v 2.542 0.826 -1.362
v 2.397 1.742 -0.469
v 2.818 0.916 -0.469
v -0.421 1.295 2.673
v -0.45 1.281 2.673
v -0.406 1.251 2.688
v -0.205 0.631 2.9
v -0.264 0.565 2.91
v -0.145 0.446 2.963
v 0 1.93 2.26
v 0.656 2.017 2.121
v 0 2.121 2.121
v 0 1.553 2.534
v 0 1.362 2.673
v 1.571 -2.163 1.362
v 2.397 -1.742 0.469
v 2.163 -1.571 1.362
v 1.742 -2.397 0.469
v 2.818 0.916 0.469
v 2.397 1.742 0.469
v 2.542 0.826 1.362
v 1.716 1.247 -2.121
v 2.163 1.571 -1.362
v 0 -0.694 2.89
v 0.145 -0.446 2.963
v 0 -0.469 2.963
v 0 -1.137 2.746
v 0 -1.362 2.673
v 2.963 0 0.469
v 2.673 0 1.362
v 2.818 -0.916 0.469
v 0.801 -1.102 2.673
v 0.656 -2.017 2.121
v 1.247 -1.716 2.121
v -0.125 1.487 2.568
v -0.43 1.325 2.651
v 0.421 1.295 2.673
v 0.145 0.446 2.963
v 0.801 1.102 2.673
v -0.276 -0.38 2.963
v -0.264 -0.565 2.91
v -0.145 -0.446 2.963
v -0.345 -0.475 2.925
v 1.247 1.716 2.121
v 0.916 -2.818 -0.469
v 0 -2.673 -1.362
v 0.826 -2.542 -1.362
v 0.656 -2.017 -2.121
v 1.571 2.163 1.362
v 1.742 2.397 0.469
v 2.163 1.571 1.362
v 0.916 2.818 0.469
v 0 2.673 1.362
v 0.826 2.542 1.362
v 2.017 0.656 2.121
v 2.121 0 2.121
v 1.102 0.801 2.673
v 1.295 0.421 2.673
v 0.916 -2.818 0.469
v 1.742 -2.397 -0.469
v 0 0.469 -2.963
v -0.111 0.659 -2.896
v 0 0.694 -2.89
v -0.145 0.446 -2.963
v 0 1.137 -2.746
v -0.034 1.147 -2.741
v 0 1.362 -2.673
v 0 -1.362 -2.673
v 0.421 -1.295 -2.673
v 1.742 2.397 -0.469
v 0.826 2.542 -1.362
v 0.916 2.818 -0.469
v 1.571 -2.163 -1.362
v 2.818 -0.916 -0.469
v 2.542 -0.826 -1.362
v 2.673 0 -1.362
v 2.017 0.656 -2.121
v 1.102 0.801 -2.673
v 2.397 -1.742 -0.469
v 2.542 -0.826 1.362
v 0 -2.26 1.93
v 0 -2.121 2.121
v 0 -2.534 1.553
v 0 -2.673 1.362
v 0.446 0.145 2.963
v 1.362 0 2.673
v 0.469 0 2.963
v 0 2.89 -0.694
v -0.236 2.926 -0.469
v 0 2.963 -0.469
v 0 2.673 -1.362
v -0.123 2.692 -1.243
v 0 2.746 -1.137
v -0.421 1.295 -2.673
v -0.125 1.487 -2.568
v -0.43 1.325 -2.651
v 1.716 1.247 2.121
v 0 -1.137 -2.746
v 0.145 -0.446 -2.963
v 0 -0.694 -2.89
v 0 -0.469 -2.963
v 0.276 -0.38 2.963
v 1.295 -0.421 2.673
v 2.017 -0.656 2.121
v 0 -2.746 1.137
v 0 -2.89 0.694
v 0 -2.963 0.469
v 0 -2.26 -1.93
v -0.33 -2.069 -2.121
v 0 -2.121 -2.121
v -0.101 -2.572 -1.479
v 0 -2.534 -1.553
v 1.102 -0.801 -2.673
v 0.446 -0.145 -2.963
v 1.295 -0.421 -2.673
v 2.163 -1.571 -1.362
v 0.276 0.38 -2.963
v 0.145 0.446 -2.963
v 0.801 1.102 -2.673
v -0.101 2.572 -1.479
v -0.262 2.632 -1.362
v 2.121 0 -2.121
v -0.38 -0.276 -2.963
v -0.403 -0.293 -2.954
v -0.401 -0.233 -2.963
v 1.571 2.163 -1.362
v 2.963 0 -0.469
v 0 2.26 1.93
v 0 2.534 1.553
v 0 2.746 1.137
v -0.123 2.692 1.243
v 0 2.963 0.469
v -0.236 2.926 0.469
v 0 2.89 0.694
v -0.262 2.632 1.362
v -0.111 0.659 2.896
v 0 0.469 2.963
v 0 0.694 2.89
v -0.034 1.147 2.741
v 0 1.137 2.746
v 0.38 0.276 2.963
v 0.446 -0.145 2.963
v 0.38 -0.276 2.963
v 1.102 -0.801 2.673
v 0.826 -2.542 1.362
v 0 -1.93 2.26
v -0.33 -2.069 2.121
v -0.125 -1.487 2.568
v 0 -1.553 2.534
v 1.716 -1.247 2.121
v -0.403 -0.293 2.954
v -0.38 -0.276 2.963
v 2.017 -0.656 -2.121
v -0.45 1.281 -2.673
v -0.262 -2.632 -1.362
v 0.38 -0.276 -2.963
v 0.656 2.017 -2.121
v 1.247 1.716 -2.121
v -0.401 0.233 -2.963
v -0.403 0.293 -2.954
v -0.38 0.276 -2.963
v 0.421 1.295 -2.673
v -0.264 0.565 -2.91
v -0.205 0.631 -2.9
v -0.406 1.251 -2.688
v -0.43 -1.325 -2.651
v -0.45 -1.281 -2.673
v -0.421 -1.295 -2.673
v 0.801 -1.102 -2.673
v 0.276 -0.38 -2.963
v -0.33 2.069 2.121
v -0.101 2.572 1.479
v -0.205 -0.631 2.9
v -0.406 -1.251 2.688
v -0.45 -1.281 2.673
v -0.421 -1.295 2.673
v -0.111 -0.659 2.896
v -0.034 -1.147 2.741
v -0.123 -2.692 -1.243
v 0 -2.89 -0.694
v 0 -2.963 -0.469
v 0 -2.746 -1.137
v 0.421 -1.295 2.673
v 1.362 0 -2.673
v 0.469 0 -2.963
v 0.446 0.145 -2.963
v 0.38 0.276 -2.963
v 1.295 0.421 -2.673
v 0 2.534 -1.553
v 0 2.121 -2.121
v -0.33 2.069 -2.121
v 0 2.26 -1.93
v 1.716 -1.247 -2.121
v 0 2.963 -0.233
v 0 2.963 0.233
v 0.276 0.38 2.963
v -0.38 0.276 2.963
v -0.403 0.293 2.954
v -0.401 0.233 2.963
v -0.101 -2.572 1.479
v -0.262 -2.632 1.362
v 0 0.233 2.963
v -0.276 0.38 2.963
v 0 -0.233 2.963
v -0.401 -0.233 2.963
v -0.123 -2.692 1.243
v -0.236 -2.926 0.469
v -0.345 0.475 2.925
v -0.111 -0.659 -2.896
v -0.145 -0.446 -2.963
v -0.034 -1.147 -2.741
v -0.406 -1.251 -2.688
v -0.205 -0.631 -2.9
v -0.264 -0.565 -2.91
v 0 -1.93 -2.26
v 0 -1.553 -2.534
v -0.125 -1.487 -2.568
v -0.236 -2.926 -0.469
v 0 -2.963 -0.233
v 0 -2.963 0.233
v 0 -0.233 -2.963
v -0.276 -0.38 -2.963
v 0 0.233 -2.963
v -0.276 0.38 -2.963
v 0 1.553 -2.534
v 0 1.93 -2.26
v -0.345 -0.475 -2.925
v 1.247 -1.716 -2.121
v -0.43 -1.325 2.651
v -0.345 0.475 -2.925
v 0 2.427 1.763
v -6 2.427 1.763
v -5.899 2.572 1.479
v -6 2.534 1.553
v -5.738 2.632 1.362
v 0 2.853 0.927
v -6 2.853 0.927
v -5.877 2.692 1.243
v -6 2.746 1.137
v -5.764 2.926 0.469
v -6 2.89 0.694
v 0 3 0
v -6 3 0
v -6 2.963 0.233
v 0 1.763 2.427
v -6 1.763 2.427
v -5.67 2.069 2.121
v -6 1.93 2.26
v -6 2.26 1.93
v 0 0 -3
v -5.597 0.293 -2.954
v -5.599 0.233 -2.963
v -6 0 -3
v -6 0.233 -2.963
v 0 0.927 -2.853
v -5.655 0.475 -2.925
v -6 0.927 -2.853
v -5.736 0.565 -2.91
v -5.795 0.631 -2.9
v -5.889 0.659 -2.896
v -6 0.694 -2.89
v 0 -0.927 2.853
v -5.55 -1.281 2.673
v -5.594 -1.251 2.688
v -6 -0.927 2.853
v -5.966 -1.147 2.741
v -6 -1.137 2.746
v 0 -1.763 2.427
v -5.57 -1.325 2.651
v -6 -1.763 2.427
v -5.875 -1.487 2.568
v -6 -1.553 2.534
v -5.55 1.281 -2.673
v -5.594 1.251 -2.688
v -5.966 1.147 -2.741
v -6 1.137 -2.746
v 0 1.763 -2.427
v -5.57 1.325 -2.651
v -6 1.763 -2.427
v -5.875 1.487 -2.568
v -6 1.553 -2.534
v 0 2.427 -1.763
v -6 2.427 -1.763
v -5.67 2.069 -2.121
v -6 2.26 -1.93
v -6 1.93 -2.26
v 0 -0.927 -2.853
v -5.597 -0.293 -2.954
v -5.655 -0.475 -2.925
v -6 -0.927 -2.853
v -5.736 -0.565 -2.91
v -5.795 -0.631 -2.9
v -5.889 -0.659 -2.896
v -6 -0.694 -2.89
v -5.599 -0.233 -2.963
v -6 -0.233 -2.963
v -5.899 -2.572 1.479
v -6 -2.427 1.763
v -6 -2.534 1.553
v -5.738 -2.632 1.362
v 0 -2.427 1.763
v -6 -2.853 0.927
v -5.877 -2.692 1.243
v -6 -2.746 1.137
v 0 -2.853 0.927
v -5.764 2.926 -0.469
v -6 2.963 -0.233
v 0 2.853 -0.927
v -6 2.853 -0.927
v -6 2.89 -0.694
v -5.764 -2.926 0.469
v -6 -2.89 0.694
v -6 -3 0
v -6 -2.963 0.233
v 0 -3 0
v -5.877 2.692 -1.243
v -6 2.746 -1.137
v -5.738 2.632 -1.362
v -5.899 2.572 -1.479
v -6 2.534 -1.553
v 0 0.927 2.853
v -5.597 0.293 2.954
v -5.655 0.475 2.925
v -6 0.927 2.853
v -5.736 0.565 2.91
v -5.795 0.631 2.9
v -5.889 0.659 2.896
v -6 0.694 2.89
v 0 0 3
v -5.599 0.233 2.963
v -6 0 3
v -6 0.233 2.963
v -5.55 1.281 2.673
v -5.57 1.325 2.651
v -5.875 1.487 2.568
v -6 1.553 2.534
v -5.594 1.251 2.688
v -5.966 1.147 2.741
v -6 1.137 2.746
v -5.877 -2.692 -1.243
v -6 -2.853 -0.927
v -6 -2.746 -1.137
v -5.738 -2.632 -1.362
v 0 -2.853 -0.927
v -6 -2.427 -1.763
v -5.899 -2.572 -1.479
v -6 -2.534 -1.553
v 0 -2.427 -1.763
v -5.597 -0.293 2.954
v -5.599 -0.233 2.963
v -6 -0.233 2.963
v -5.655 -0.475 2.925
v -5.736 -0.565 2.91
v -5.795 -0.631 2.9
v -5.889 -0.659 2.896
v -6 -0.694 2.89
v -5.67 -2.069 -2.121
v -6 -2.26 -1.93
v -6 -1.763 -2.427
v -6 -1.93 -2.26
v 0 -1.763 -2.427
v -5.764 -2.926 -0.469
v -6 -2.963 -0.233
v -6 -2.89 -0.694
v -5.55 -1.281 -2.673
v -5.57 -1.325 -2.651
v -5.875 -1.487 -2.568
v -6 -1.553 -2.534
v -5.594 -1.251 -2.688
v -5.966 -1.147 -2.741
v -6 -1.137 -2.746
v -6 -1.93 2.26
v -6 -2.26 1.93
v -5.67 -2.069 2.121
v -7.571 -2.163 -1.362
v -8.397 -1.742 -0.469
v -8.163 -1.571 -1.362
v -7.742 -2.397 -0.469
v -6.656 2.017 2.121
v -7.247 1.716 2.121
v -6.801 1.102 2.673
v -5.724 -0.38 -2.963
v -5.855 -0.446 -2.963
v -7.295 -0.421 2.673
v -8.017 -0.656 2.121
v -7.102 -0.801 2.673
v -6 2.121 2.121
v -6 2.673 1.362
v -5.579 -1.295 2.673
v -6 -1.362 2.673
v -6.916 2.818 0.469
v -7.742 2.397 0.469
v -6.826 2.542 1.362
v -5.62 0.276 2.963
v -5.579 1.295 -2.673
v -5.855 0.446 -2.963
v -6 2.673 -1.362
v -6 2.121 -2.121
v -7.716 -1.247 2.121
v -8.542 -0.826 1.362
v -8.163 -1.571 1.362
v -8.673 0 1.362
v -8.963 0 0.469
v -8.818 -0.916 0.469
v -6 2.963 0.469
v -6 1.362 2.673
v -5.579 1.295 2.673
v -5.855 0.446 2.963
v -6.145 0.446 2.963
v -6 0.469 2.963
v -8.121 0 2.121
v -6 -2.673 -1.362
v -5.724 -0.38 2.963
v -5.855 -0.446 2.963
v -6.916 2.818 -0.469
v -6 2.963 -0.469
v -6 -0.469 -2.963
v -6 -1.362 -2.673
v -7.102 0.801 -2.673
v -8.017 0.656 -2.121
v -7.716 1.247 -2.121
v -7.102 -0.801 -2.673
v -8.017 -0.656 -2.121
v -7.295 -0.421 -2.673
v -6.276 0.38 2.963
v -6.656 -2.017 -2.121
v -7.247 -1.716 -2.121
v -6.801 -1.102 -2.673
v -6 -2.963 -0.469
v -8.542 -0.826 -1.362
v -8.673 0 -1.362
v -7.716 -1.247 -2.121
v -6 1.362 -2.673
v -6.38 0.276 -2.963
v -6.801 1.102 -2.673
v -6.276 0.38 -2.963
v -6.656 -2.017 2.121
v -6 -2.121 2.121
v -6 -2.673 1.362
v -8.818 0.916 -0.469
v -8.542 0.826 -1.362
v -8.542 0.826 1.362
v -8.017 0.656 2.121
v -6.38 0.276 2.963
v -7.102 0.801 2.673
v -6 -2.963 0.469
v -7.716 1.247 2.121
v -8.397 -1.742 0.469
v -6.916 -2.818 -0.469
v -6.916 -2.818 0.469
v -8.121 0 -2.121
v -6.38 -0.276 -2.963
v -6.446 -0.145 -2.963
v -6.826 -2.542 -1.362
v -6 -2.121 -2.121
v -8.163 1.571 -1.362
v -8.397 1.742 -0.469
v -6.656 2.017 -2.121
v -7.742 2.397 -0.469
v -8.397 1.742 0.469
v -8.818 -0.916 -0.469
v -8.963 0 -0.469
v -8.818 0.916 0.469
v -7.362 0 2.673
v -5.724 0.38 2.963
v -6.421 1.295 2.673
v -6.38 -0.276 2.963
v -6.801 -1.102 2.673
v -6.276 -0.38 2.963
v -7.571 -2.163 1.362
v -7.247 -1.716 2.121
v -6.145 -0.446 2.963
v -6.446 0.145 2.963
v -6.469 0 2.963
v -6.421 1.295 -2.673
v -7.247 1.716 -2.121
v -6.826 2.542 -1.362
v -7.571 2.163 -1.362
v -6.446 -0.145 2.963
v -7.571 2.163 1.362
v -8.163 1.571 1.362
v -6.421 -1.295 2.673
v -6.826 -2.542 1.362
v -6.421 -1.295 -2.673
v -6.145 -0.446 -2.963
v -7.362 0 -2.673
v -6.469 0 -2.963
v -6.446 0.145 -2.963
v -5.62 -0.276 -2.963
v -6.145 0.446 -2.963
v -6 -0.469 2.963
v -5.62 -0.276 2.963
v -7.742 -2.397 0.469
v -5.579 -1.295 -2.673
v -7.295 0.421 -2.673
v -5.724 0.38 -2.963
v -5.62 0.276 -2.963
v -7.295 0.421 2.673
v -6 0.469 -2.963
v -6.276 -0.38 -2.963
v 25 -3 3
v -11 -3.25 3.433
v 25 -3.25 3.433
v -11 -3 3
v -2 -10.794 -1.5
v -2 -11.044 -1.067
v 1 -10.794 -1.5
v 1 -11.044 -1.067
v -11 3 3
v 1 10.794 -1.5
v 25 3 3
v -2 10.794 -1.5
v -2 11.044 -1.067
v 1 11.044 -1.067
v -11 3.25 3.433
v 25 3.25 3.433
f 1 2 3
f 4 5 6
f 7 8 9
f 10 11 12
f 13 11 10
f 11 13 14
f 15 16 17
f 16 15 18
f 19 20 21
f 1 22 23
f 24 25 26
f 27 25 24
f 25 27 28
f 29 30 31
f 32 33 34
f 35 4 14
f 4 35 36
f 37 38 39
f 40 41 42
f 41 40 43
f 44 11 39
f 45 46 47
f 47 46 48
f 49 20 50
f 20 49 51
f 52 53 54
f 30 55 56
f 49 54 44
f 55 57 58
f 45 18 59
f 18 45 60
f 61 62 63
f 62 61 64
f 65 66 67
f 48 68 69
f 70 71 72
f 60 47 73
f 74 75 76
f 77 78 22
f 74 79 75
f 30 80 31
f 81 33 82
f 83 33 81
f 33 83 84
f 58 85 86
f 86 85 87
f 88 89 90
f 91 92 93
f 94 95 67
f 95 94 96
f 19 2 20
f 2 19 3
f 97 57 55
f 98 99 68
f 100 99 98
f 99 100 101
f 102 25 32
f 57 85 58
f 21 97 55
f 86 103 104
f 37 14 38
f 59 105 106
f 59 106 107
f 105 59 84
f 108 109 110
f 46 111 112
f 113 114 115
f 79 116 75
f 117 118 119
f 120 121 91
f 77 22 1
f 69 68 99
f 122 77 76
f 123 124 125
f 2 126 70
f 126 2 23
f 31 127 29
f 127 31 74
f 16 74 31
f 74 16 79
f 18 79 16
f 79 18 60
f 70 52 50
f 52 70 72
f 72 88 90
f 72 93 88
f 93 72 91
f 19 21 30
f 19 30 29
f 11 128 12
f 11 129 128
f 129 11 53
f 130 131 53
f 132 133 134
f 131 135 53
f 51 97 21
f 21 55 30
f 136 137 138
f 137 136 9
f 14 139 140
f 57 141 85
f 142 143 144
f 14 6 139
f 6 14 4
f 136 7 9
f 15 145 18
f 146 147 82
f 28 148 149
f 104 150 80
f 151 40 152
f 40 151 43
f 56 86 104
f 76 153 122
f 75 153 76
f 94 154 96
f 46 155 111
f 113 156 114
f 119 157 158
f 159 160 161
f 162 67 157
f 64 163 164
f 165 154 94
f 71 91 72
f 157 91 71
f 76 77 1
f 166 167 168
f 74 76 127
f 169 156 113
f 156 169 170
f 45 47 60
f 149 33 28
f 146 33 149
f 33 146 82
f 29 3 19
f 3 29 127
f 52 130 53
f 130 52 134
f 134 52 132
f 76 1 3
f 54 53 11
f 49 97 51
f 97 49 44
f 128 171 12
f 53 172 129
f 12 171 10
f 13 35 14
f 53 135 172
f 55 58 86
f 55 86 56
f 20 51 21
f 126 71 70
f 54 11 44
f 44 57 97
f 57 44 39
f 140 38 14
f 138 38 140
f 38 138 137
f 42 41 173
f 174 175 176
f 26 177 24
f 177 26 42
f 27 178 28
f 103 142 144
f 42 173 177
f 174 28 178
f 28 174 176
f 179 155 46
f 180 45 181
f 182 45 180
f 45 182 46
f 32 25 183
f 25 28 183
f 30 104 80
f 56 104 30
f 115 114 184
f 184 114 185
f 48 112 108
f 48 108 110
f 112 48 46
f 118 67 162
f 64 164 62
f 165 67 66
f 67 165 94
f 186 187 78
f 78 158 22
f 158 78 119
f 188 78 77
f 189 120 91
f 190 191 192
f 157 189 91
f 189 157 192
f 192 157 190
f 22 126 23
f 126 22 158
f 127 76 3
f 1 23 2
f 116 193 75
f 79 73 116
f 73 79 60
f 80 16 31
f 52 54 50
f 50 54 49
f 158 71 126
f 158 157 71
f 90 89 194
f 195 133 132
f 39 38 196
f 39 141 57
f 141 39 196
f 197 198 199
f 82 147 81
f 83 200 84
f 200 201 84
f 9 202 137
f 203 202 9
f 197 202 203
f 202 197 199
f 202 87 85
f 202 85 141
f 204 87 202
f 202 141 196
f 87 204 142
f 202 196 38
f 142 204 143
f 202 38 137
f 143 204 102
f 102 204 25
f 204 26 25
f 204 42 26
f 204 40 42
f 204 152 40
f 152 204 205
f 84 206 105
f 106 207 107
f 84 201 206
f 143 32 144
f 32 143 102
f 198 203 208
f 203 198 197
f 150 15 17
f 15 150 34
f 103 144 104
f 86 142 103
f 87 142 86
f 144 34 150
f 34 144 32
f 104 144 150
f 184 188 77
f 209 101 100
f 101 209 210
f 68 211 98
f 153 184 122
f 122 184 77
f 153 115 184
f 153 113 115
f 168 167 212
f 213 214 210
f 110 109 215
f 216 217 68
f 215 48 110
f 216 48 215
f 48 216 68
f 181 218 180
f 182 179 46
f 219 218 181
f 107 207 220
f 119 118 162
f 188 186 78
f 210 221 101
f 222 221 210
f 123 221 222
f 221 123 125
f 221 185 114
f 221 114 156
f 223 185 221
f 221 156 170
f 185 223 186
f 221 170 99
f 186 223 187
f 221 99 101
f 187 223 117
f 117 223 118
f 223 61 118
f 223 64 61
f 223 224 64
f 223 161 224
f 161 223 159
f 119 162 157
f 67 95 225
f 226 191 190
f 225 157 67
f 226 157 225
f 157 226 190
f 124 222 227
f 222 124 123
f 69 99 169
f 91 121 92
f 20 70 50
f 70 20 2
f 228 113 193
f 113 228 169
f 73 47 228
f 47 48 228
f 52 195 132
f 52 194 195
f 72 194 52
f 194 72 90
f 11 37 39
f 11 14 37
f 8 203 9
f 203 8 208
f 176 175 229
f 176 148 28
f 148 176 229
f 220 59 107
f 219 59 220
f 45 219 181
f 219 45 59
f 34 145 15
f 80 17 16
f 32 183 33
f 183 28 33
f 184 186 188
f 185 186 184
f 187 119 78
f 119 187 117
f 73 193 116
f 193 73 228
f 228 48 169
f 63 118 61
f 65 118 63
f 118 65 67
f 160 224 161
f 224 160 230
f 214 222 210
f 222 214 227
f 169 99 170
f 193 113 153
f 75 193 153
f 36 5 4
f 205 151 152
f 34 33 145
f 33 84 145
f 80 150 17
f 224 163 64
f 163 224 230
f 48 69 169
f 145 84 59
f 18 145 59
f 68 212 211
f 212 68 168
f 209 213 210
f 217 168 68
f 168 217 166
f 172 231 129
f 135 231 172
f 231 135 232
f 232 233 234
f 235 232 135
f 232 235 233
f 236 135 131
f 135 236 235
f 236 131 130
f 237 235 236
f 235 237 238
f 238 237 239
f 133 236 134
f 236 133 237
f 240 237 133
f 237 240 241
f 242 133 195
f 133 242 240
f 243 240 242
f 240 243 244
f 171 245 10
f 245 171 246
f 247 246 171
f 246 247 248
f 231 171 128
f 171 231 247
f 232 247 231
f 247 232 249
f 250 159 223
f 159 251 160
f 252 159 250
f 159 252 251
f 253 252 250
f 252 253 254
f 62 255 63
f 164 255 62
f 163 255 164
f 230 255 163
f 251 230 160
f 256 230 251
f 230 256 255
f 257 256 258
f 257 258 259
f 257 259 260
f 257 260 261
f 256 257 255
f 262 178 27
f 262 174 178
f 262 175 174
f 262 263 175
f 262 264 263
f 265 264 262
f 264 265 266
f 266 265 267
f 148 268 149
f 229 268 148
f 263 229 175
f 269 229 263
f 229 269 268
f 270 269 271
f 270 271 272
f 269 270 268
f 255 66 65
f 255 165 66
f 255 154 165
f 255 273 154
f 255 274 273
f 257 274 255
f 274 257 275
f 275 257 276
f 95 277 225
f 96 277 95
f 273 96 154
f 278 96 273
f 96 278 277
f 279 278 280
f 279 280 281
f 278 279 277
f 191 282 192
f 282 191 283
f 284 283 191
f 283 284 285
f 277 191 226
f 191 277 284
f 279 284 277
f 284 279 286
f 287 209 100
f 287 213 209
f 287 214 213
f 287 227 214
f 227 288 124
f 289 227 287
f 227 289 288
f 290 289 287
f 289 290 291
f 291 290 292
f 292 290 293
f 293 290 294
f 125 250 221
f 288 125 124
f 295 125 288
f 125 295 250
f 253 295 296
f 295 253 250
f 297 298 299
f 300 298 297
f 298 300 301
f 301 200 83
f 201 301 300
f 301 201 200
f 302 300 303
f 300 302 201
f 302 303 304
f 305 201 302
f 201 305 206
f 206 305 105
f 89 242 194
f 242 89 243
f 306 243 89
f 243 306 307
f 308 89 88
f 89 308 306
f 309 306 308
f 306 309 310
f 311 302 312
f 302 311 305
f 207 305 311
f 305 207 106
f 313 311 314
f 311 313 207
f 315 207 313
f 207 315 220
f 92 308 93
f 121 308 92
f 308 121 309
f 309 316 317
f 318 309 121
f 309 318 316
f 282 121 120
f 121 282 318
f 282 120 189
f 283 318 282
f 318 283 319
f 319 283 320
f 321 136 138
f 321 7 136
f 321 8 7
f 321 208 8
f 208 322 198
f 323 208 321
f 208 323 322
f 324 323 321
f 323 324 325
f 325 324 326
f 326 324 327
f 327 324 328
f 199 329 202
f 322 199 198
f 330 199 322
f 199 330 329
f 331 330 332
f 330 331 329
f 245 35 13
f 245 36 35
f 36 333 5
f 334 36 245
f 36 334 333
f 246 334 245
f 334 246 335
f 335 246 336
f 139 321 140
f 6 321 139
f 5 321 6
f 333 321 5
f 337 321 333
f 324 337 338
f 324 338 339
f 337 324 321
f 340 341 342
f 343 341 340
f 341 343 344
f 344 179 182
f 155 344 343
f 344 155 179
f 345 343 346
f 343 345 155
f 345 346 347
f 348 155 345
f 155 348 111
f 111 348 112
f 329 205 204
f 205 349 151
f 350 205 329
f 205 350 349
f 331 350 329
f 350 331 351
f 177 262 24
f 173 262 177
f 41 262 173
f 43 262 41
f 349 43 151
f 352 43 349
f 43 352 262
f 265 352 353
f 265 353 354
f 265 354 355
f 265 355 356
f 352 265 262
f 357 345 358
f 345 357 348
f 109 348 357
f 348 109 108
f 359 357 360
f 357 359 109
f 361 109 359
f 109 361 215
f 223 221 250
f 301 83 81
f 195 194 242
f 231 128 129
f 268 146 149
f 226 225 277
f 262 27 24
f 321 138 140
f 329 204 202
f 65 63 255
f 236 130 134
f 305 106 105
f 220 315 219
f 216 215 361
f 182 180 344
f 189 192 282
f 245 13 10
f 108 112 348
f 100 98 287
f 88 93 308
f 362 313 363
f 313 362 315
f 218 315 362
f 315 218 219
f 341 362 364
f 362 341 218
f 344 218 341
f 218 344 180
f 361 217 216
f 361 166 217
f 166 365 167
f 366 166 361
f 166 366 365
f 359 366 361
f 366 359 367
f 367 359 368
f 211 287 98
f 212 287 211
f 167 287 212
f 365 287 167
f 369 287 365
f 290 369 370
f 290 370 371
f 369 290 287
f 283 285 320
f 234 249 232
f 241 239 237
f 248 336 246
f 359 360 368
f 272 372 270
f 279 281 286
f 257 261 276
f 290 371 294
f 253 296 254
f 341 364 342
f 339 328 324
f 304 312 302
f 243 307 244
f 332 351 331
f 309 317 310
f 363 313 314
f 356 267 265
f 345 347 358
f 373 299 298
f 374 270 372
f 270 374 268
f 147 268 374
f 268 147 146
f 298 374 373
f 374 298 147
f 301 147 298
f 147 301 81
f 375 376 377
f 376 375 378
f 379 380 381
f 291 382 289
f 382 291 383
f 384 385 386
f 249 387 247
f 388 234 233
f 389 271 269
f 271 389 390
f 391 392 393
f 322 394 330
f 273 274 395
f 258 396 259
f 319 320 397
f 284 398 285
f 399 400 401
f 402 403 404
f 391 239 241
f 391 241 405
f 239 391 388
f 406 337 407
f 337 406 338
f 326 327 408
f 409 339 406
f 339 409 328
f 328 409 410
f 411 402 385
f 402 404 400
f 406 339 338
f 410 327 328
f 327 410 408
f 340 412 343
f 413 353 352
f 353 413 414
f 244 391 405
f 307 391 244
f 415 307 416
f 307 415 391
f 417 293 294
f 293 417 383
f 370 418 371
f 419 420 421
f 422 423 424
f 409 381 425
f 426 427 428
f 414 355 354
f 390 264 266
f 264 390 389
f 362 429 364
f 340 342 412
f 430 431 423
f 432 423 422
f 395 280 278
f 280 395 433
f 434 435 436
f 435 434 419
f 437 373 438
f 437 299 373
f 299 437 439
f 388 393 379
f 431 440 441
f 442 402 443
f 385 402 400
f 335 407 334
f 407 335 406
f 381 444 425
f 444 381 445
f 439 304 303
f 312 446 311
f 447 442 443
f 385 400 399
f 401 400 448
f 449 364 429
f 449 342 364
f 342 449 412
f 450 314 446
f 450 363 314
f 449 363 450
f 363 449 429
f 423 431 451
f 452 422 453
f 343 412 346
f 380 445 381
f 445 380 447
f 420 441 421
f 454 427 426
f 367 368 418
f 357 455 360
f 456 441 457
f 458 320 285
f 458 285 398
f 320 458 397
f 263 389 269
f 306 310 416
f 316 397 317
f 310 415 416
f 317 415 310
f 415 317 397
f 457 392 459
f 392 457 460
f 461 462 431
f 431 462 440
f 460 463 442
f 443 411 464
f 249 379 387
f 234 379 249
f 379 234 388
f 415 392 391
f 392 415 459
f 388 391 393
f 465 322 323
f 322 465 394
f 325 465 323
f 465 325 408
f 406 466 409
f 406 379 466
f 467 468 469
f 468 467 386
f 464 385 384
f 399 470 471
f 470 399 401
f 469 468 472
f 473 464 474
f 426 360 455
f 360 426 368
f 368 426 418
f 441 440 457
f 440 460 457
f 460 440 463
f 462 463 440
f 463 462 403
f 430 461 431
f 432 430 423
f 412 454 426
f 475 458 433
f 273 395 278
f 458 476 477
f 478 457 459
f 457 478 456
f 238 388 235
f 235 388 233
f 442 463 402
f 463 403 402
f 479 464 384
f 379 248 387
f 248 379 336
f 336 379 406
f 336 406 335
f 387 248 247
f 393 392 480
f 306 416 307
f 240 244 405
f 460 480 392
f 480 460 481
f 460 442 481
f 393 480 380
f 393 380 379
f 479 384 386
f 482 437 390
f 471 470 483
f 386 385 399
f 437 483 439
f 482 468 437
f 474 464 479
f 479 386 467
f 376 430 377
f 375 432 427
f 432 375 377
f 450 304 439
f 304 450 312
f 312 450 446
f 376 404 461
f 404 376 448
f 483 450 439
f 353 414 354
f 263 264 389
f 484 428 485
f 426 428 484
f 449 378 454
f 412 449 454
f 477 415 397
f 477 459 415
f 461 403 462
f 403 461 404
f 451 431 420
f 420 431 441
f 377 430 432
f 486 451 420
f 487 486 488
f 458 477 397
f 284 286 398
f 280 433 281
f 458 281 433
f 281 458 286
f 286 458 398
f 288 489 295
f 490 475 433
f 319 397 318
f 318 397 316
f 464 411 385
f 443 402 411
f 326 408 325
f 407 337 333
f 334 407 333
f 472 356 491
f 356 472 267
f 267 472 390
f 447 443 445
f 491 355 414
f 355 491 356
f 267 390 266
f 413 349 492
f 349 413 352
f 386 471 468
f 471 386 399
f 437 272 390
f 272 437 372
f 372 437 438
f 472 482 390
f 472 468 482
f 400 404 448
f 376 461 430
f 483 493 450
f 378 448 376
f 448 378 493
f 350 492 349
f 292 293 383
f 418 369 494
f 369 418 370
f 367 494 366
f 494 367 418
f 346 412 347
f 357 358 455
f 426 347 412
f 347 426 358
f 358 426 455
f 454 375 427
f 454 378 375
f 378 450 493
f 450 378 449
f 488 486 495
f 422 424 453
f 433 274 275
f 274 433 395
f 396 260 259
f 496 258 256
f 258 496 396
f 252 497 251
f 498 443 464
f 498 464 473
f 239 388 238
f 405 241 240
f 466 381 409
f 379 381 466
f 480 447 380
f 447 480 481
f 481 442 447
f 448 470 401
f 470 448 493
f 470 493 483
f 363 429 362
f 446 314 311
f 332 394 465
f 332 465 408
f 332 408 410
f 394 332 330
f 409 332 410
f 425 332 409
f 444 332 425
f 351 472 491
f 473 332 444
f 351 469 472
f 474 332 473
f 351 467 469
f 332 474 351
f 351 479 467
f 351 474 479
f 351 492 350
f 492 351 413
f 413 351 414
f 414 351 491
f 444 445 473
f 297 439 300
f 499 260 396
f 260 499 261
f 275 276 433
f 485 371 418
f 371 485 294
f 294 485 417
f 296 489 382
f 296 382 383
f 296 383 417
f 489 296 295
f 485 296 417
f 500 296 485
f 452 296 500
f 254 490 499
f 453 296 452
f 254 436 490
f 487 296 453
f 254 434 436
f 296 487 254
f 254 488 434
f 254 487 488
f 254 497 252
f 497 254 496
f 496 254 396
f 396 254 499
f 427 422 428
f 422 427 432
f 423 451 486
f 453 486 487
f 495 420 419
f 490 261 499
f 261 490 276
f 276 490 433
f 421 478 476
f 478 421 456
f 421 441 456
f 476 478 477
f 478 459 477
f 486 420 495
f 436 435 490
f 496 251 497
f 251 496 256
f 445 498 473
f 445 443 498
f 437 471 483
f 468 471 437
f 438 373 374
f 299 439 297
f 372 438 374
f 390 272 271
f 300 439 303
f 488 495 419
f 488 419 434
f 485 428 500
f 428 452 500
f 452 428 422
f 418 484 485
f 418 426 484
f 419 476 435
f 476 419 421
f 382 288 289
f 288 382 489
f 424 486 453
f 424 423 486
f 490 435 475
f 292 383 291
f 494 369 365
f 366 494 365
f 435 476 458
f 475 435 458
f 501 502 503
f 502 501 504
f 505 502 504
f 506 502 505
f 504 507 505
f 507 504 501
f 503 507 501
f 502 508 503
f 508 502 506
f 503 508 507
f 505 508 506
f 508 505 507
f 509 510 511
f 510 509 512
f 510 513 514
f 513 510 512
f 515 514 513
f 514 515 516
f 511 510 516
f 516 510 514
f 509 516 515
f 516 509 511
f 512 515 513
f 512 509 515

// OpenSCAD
    
    
    
    
    module Cuerpo(radio=3,def=20,largoT=6){
    //cabina
    sphere(r=radio,$fn=def);
    //fin cabina
    
    //cuerpo    
    rotate([90,0,90])
    translate([0,0,-largoT])
    cylinder(r=radio,$fn=def,h=largoT);
    //fin cuerpo
    
    //posterior
    translate([-largoT,0,0])
     sphere(r=radio,$fn=def);
    //fin posterior
        
    }
    
    //modulo Ala
    module Ala(   largoAla=12,
    lateralAla=9,
    anchoAla=3,
    espesor=1)
    {
    linear_extrude(height=espesor)
     polygon( points=[[0,0],[largoAla,0],[lateralAla,anchoAla],[(lateralAla-(lateralAla/anchoAla)),anchoAla]]);
    }
    
    //fin modulo ala
    color("grey")
    Cuerpo();
    
    escalaAla=3;
    rotate(180)
    translate([-25,0,0])
    translate([0,3,3])
    rotate([-30,0,0])
     color("black")
    Ala(12*escalaAla,9*escalaAla,3*escalaAla,0.5);
    
    mirror([0,1,0]){
         rotate(180)
    translate([-25,0,0])
    translate([0,3,3])
    rotate([-30,0,0])
         color("black")
    Ala(12*escalaAla,9*escalaAla,3*escalaAla,0.5);
    
    }
